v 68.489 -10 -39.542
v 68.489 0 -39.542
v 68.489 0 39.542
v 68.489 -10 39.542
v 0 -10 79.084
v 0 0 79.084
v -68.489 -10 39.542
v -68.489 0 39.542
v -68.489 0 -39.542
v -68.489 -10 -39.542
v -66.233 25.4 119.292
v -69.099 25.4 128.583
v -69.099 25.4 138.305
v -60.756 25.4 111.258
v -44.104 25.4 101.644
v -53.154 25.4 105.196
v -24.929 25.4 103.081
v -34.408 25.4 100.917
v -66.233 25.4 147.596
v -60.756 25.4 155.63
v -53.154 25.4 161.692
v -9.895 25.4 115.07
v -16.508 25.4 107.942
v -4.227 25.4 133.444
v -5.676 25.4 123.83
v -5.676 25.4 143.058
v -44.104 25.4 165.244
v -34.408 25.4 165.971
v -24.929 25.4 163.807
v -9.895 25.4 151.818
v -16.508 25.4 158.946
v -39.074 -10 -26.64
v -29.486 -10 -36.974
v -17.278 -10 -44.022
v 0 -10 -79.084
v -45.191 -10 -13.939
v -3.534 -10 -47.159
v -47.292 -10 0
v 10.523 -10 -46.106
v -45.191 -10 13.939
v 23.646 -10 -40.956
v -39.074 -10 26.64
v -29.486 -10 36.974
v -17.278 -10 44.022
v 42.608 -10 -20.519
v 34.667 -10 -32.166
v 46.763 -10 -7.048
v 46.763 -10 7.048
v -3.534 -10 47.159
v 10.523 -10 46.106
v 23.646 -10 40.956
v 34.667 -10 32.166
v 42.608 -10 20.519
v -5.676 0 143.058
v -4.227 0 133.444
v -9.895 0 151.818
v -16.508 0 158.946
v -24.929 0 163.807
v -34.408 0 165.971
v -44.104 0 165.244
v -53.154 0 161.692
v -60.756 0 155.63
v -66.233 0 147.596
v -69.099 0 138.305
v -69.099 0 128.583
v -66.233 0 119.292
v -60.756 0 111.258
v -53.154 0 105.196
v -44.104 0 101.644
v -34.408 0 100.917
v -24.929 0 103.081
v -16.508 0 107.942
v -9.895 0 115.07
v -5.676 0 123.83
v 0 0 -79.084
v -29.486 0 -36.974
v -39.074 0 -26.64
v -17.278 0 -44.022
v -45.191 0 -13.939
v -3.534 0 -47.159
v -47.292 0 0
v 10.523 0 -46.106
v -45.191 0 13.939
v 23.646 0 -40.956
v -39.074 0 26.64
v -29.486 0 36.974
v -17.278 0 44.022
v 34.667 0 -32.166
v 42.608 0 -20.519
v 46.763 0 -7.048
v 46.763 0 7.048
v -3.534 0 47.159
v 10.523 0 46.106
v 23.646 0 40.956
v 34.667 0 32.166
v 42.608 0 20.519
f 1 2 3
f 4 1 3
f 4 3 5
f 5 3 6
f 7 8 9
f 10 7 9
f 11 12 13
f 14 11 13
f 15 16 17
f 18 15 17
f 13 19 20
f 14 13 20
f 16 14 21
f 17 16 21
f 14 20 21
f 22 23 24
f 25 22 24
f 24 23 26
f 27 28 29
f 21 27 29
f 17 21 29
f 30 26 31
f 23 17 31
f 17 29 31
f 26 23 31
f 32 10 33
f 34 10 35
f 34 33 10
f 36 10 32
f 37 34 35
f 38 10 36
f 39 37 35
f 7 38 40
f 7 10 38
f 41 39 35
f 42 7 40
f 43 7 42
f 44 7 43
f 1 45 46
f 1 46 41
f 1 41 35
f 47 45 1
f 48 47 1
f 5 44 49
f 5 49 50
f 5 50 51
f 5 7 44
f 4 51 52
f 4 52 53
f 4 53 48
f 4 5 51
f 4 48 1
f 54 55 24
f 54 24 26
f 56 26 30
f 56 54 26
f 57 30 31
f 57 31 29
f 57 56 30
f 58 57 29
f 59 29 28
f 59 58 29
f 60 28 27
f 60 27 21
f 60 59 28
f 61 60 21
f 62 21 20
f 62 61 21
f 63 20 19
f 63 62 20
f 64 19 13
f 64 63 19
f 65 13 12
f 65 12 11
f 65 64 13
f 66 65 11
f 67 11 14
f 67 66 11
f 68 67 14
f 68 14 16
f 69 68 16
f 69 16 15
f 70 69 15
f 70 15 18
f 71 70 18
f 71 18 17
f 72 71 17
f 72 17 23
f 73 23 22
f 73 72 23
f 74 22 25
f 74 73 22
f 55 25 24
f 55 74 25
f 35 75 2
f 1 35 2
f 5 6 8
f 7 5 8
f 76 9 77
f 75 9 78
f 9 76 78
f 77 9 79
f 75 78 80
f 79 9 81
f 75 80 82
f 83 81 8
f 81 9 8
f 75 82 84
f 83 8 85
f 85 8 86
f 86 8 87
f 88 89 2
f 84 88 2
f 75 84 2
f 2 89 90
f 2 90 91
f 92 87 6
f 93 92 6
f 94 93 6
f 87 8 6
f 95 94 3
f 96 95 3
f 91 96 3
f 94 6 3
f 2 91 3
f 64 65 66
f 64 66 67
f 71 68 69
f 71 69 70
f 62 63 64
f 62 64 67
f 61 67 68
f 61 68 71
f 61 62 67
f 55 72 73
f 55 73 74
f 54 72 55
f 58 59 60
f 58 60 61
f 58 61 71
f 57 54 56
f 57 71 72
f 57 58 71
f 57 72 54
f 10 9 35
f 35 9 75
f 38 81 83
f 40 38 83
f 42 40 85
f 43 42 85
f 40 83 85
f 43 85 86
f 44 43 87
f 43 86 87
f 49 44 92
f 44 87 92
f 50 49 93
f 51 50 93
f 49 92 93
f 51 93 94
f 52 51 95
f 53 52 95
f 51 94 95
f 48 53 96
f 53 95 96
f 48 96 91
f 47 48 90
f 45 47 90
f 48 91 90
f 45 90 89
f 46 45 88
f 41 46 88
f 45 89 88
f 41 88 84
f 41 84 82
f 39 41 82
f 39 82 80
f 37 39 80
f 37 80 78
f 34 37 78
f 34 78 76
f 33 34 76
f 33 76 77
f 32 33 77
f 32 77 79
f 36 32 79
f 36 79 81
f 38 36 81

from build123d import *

# Parameters (mm, degrees)
F1_DEPTH  = 10
F2_R      = 45.4942813863
F3_DEPTH  = 25.4
F4_R      = 47.204093178
F5_DEPTH  = 25.4
F6_R      = 46.3847051747
F7_DEPTH  = 10
F8_R      = 47.2915401182
F9_DEPTH  = 25.4
F10_R     = 32.6180484156
F10_R_2   = 26.2680526833
F11_DEPTH = 25.399999693


with BuildPart() as f1:
    # F0 (on Front) → F1 (new body)
    with BuildSketch(Plane.XZ):
        Polygon((-68.4885542918, -39.5418852568), (0, -79.0837705135), (68.4885542918, -39.5418852568), (68.4885542918, 39.5418852568), (0, 79.0837705135), (-68.4885542918, 39.5418852568), align=None)
    extrude(amount=F1_DEPTH)

    # F2 (on Front) → F3 (cut)
    with BuildSketch(Plane.XZ):
        Circle(F2_R)
    extrude(amount=-F3_DEPTH, mode=Mode.SUBTRACT)

    # F4 (on Front) → F5 (cut)
    with BuildSketch(Plane.XZ):
        Circle(F4_R)
    extrude(amount=-F5_DEPTH, mode=Mode.SUBTRACT)

    # F6 (on Front) → F7 (cut)
    with BuildSketch(Plane.XZ):
        Circle(F6_R)
    extrude(amount=-F7_DEPTH, mode=Mode.SUBTRACT)

    # F8 (on face) → F9 (cut)
    with BuildSketch(Plane(origin=(0, 0, 0), x_dir=(-1, 0, 0), z_dir=(0, 1, 0))):
        Circle(F8_R)
    extrude(amount=-F9_DEPTH, mode=Mode.SUBTRACT)


with BuildPart() as f11:
    # F10 (on Front) → F11 (new body)
    with BuildSketch(Plane.XZ):
        with Locations((-36.8453972042, 133.4440261126)):
            Circle(F10_R)
        with Locations((-36.8453972042, 133.4440261126)):
            Circle(F10_R_2, mode=Mode.SUBTRACT)
        with Locations((-36.8453972042, 133.4440261126)):
            Circle(F10_R_2)
    extrude(amount=-F11_DEPTH)


solid = Compound([f1.part, f11.part])
